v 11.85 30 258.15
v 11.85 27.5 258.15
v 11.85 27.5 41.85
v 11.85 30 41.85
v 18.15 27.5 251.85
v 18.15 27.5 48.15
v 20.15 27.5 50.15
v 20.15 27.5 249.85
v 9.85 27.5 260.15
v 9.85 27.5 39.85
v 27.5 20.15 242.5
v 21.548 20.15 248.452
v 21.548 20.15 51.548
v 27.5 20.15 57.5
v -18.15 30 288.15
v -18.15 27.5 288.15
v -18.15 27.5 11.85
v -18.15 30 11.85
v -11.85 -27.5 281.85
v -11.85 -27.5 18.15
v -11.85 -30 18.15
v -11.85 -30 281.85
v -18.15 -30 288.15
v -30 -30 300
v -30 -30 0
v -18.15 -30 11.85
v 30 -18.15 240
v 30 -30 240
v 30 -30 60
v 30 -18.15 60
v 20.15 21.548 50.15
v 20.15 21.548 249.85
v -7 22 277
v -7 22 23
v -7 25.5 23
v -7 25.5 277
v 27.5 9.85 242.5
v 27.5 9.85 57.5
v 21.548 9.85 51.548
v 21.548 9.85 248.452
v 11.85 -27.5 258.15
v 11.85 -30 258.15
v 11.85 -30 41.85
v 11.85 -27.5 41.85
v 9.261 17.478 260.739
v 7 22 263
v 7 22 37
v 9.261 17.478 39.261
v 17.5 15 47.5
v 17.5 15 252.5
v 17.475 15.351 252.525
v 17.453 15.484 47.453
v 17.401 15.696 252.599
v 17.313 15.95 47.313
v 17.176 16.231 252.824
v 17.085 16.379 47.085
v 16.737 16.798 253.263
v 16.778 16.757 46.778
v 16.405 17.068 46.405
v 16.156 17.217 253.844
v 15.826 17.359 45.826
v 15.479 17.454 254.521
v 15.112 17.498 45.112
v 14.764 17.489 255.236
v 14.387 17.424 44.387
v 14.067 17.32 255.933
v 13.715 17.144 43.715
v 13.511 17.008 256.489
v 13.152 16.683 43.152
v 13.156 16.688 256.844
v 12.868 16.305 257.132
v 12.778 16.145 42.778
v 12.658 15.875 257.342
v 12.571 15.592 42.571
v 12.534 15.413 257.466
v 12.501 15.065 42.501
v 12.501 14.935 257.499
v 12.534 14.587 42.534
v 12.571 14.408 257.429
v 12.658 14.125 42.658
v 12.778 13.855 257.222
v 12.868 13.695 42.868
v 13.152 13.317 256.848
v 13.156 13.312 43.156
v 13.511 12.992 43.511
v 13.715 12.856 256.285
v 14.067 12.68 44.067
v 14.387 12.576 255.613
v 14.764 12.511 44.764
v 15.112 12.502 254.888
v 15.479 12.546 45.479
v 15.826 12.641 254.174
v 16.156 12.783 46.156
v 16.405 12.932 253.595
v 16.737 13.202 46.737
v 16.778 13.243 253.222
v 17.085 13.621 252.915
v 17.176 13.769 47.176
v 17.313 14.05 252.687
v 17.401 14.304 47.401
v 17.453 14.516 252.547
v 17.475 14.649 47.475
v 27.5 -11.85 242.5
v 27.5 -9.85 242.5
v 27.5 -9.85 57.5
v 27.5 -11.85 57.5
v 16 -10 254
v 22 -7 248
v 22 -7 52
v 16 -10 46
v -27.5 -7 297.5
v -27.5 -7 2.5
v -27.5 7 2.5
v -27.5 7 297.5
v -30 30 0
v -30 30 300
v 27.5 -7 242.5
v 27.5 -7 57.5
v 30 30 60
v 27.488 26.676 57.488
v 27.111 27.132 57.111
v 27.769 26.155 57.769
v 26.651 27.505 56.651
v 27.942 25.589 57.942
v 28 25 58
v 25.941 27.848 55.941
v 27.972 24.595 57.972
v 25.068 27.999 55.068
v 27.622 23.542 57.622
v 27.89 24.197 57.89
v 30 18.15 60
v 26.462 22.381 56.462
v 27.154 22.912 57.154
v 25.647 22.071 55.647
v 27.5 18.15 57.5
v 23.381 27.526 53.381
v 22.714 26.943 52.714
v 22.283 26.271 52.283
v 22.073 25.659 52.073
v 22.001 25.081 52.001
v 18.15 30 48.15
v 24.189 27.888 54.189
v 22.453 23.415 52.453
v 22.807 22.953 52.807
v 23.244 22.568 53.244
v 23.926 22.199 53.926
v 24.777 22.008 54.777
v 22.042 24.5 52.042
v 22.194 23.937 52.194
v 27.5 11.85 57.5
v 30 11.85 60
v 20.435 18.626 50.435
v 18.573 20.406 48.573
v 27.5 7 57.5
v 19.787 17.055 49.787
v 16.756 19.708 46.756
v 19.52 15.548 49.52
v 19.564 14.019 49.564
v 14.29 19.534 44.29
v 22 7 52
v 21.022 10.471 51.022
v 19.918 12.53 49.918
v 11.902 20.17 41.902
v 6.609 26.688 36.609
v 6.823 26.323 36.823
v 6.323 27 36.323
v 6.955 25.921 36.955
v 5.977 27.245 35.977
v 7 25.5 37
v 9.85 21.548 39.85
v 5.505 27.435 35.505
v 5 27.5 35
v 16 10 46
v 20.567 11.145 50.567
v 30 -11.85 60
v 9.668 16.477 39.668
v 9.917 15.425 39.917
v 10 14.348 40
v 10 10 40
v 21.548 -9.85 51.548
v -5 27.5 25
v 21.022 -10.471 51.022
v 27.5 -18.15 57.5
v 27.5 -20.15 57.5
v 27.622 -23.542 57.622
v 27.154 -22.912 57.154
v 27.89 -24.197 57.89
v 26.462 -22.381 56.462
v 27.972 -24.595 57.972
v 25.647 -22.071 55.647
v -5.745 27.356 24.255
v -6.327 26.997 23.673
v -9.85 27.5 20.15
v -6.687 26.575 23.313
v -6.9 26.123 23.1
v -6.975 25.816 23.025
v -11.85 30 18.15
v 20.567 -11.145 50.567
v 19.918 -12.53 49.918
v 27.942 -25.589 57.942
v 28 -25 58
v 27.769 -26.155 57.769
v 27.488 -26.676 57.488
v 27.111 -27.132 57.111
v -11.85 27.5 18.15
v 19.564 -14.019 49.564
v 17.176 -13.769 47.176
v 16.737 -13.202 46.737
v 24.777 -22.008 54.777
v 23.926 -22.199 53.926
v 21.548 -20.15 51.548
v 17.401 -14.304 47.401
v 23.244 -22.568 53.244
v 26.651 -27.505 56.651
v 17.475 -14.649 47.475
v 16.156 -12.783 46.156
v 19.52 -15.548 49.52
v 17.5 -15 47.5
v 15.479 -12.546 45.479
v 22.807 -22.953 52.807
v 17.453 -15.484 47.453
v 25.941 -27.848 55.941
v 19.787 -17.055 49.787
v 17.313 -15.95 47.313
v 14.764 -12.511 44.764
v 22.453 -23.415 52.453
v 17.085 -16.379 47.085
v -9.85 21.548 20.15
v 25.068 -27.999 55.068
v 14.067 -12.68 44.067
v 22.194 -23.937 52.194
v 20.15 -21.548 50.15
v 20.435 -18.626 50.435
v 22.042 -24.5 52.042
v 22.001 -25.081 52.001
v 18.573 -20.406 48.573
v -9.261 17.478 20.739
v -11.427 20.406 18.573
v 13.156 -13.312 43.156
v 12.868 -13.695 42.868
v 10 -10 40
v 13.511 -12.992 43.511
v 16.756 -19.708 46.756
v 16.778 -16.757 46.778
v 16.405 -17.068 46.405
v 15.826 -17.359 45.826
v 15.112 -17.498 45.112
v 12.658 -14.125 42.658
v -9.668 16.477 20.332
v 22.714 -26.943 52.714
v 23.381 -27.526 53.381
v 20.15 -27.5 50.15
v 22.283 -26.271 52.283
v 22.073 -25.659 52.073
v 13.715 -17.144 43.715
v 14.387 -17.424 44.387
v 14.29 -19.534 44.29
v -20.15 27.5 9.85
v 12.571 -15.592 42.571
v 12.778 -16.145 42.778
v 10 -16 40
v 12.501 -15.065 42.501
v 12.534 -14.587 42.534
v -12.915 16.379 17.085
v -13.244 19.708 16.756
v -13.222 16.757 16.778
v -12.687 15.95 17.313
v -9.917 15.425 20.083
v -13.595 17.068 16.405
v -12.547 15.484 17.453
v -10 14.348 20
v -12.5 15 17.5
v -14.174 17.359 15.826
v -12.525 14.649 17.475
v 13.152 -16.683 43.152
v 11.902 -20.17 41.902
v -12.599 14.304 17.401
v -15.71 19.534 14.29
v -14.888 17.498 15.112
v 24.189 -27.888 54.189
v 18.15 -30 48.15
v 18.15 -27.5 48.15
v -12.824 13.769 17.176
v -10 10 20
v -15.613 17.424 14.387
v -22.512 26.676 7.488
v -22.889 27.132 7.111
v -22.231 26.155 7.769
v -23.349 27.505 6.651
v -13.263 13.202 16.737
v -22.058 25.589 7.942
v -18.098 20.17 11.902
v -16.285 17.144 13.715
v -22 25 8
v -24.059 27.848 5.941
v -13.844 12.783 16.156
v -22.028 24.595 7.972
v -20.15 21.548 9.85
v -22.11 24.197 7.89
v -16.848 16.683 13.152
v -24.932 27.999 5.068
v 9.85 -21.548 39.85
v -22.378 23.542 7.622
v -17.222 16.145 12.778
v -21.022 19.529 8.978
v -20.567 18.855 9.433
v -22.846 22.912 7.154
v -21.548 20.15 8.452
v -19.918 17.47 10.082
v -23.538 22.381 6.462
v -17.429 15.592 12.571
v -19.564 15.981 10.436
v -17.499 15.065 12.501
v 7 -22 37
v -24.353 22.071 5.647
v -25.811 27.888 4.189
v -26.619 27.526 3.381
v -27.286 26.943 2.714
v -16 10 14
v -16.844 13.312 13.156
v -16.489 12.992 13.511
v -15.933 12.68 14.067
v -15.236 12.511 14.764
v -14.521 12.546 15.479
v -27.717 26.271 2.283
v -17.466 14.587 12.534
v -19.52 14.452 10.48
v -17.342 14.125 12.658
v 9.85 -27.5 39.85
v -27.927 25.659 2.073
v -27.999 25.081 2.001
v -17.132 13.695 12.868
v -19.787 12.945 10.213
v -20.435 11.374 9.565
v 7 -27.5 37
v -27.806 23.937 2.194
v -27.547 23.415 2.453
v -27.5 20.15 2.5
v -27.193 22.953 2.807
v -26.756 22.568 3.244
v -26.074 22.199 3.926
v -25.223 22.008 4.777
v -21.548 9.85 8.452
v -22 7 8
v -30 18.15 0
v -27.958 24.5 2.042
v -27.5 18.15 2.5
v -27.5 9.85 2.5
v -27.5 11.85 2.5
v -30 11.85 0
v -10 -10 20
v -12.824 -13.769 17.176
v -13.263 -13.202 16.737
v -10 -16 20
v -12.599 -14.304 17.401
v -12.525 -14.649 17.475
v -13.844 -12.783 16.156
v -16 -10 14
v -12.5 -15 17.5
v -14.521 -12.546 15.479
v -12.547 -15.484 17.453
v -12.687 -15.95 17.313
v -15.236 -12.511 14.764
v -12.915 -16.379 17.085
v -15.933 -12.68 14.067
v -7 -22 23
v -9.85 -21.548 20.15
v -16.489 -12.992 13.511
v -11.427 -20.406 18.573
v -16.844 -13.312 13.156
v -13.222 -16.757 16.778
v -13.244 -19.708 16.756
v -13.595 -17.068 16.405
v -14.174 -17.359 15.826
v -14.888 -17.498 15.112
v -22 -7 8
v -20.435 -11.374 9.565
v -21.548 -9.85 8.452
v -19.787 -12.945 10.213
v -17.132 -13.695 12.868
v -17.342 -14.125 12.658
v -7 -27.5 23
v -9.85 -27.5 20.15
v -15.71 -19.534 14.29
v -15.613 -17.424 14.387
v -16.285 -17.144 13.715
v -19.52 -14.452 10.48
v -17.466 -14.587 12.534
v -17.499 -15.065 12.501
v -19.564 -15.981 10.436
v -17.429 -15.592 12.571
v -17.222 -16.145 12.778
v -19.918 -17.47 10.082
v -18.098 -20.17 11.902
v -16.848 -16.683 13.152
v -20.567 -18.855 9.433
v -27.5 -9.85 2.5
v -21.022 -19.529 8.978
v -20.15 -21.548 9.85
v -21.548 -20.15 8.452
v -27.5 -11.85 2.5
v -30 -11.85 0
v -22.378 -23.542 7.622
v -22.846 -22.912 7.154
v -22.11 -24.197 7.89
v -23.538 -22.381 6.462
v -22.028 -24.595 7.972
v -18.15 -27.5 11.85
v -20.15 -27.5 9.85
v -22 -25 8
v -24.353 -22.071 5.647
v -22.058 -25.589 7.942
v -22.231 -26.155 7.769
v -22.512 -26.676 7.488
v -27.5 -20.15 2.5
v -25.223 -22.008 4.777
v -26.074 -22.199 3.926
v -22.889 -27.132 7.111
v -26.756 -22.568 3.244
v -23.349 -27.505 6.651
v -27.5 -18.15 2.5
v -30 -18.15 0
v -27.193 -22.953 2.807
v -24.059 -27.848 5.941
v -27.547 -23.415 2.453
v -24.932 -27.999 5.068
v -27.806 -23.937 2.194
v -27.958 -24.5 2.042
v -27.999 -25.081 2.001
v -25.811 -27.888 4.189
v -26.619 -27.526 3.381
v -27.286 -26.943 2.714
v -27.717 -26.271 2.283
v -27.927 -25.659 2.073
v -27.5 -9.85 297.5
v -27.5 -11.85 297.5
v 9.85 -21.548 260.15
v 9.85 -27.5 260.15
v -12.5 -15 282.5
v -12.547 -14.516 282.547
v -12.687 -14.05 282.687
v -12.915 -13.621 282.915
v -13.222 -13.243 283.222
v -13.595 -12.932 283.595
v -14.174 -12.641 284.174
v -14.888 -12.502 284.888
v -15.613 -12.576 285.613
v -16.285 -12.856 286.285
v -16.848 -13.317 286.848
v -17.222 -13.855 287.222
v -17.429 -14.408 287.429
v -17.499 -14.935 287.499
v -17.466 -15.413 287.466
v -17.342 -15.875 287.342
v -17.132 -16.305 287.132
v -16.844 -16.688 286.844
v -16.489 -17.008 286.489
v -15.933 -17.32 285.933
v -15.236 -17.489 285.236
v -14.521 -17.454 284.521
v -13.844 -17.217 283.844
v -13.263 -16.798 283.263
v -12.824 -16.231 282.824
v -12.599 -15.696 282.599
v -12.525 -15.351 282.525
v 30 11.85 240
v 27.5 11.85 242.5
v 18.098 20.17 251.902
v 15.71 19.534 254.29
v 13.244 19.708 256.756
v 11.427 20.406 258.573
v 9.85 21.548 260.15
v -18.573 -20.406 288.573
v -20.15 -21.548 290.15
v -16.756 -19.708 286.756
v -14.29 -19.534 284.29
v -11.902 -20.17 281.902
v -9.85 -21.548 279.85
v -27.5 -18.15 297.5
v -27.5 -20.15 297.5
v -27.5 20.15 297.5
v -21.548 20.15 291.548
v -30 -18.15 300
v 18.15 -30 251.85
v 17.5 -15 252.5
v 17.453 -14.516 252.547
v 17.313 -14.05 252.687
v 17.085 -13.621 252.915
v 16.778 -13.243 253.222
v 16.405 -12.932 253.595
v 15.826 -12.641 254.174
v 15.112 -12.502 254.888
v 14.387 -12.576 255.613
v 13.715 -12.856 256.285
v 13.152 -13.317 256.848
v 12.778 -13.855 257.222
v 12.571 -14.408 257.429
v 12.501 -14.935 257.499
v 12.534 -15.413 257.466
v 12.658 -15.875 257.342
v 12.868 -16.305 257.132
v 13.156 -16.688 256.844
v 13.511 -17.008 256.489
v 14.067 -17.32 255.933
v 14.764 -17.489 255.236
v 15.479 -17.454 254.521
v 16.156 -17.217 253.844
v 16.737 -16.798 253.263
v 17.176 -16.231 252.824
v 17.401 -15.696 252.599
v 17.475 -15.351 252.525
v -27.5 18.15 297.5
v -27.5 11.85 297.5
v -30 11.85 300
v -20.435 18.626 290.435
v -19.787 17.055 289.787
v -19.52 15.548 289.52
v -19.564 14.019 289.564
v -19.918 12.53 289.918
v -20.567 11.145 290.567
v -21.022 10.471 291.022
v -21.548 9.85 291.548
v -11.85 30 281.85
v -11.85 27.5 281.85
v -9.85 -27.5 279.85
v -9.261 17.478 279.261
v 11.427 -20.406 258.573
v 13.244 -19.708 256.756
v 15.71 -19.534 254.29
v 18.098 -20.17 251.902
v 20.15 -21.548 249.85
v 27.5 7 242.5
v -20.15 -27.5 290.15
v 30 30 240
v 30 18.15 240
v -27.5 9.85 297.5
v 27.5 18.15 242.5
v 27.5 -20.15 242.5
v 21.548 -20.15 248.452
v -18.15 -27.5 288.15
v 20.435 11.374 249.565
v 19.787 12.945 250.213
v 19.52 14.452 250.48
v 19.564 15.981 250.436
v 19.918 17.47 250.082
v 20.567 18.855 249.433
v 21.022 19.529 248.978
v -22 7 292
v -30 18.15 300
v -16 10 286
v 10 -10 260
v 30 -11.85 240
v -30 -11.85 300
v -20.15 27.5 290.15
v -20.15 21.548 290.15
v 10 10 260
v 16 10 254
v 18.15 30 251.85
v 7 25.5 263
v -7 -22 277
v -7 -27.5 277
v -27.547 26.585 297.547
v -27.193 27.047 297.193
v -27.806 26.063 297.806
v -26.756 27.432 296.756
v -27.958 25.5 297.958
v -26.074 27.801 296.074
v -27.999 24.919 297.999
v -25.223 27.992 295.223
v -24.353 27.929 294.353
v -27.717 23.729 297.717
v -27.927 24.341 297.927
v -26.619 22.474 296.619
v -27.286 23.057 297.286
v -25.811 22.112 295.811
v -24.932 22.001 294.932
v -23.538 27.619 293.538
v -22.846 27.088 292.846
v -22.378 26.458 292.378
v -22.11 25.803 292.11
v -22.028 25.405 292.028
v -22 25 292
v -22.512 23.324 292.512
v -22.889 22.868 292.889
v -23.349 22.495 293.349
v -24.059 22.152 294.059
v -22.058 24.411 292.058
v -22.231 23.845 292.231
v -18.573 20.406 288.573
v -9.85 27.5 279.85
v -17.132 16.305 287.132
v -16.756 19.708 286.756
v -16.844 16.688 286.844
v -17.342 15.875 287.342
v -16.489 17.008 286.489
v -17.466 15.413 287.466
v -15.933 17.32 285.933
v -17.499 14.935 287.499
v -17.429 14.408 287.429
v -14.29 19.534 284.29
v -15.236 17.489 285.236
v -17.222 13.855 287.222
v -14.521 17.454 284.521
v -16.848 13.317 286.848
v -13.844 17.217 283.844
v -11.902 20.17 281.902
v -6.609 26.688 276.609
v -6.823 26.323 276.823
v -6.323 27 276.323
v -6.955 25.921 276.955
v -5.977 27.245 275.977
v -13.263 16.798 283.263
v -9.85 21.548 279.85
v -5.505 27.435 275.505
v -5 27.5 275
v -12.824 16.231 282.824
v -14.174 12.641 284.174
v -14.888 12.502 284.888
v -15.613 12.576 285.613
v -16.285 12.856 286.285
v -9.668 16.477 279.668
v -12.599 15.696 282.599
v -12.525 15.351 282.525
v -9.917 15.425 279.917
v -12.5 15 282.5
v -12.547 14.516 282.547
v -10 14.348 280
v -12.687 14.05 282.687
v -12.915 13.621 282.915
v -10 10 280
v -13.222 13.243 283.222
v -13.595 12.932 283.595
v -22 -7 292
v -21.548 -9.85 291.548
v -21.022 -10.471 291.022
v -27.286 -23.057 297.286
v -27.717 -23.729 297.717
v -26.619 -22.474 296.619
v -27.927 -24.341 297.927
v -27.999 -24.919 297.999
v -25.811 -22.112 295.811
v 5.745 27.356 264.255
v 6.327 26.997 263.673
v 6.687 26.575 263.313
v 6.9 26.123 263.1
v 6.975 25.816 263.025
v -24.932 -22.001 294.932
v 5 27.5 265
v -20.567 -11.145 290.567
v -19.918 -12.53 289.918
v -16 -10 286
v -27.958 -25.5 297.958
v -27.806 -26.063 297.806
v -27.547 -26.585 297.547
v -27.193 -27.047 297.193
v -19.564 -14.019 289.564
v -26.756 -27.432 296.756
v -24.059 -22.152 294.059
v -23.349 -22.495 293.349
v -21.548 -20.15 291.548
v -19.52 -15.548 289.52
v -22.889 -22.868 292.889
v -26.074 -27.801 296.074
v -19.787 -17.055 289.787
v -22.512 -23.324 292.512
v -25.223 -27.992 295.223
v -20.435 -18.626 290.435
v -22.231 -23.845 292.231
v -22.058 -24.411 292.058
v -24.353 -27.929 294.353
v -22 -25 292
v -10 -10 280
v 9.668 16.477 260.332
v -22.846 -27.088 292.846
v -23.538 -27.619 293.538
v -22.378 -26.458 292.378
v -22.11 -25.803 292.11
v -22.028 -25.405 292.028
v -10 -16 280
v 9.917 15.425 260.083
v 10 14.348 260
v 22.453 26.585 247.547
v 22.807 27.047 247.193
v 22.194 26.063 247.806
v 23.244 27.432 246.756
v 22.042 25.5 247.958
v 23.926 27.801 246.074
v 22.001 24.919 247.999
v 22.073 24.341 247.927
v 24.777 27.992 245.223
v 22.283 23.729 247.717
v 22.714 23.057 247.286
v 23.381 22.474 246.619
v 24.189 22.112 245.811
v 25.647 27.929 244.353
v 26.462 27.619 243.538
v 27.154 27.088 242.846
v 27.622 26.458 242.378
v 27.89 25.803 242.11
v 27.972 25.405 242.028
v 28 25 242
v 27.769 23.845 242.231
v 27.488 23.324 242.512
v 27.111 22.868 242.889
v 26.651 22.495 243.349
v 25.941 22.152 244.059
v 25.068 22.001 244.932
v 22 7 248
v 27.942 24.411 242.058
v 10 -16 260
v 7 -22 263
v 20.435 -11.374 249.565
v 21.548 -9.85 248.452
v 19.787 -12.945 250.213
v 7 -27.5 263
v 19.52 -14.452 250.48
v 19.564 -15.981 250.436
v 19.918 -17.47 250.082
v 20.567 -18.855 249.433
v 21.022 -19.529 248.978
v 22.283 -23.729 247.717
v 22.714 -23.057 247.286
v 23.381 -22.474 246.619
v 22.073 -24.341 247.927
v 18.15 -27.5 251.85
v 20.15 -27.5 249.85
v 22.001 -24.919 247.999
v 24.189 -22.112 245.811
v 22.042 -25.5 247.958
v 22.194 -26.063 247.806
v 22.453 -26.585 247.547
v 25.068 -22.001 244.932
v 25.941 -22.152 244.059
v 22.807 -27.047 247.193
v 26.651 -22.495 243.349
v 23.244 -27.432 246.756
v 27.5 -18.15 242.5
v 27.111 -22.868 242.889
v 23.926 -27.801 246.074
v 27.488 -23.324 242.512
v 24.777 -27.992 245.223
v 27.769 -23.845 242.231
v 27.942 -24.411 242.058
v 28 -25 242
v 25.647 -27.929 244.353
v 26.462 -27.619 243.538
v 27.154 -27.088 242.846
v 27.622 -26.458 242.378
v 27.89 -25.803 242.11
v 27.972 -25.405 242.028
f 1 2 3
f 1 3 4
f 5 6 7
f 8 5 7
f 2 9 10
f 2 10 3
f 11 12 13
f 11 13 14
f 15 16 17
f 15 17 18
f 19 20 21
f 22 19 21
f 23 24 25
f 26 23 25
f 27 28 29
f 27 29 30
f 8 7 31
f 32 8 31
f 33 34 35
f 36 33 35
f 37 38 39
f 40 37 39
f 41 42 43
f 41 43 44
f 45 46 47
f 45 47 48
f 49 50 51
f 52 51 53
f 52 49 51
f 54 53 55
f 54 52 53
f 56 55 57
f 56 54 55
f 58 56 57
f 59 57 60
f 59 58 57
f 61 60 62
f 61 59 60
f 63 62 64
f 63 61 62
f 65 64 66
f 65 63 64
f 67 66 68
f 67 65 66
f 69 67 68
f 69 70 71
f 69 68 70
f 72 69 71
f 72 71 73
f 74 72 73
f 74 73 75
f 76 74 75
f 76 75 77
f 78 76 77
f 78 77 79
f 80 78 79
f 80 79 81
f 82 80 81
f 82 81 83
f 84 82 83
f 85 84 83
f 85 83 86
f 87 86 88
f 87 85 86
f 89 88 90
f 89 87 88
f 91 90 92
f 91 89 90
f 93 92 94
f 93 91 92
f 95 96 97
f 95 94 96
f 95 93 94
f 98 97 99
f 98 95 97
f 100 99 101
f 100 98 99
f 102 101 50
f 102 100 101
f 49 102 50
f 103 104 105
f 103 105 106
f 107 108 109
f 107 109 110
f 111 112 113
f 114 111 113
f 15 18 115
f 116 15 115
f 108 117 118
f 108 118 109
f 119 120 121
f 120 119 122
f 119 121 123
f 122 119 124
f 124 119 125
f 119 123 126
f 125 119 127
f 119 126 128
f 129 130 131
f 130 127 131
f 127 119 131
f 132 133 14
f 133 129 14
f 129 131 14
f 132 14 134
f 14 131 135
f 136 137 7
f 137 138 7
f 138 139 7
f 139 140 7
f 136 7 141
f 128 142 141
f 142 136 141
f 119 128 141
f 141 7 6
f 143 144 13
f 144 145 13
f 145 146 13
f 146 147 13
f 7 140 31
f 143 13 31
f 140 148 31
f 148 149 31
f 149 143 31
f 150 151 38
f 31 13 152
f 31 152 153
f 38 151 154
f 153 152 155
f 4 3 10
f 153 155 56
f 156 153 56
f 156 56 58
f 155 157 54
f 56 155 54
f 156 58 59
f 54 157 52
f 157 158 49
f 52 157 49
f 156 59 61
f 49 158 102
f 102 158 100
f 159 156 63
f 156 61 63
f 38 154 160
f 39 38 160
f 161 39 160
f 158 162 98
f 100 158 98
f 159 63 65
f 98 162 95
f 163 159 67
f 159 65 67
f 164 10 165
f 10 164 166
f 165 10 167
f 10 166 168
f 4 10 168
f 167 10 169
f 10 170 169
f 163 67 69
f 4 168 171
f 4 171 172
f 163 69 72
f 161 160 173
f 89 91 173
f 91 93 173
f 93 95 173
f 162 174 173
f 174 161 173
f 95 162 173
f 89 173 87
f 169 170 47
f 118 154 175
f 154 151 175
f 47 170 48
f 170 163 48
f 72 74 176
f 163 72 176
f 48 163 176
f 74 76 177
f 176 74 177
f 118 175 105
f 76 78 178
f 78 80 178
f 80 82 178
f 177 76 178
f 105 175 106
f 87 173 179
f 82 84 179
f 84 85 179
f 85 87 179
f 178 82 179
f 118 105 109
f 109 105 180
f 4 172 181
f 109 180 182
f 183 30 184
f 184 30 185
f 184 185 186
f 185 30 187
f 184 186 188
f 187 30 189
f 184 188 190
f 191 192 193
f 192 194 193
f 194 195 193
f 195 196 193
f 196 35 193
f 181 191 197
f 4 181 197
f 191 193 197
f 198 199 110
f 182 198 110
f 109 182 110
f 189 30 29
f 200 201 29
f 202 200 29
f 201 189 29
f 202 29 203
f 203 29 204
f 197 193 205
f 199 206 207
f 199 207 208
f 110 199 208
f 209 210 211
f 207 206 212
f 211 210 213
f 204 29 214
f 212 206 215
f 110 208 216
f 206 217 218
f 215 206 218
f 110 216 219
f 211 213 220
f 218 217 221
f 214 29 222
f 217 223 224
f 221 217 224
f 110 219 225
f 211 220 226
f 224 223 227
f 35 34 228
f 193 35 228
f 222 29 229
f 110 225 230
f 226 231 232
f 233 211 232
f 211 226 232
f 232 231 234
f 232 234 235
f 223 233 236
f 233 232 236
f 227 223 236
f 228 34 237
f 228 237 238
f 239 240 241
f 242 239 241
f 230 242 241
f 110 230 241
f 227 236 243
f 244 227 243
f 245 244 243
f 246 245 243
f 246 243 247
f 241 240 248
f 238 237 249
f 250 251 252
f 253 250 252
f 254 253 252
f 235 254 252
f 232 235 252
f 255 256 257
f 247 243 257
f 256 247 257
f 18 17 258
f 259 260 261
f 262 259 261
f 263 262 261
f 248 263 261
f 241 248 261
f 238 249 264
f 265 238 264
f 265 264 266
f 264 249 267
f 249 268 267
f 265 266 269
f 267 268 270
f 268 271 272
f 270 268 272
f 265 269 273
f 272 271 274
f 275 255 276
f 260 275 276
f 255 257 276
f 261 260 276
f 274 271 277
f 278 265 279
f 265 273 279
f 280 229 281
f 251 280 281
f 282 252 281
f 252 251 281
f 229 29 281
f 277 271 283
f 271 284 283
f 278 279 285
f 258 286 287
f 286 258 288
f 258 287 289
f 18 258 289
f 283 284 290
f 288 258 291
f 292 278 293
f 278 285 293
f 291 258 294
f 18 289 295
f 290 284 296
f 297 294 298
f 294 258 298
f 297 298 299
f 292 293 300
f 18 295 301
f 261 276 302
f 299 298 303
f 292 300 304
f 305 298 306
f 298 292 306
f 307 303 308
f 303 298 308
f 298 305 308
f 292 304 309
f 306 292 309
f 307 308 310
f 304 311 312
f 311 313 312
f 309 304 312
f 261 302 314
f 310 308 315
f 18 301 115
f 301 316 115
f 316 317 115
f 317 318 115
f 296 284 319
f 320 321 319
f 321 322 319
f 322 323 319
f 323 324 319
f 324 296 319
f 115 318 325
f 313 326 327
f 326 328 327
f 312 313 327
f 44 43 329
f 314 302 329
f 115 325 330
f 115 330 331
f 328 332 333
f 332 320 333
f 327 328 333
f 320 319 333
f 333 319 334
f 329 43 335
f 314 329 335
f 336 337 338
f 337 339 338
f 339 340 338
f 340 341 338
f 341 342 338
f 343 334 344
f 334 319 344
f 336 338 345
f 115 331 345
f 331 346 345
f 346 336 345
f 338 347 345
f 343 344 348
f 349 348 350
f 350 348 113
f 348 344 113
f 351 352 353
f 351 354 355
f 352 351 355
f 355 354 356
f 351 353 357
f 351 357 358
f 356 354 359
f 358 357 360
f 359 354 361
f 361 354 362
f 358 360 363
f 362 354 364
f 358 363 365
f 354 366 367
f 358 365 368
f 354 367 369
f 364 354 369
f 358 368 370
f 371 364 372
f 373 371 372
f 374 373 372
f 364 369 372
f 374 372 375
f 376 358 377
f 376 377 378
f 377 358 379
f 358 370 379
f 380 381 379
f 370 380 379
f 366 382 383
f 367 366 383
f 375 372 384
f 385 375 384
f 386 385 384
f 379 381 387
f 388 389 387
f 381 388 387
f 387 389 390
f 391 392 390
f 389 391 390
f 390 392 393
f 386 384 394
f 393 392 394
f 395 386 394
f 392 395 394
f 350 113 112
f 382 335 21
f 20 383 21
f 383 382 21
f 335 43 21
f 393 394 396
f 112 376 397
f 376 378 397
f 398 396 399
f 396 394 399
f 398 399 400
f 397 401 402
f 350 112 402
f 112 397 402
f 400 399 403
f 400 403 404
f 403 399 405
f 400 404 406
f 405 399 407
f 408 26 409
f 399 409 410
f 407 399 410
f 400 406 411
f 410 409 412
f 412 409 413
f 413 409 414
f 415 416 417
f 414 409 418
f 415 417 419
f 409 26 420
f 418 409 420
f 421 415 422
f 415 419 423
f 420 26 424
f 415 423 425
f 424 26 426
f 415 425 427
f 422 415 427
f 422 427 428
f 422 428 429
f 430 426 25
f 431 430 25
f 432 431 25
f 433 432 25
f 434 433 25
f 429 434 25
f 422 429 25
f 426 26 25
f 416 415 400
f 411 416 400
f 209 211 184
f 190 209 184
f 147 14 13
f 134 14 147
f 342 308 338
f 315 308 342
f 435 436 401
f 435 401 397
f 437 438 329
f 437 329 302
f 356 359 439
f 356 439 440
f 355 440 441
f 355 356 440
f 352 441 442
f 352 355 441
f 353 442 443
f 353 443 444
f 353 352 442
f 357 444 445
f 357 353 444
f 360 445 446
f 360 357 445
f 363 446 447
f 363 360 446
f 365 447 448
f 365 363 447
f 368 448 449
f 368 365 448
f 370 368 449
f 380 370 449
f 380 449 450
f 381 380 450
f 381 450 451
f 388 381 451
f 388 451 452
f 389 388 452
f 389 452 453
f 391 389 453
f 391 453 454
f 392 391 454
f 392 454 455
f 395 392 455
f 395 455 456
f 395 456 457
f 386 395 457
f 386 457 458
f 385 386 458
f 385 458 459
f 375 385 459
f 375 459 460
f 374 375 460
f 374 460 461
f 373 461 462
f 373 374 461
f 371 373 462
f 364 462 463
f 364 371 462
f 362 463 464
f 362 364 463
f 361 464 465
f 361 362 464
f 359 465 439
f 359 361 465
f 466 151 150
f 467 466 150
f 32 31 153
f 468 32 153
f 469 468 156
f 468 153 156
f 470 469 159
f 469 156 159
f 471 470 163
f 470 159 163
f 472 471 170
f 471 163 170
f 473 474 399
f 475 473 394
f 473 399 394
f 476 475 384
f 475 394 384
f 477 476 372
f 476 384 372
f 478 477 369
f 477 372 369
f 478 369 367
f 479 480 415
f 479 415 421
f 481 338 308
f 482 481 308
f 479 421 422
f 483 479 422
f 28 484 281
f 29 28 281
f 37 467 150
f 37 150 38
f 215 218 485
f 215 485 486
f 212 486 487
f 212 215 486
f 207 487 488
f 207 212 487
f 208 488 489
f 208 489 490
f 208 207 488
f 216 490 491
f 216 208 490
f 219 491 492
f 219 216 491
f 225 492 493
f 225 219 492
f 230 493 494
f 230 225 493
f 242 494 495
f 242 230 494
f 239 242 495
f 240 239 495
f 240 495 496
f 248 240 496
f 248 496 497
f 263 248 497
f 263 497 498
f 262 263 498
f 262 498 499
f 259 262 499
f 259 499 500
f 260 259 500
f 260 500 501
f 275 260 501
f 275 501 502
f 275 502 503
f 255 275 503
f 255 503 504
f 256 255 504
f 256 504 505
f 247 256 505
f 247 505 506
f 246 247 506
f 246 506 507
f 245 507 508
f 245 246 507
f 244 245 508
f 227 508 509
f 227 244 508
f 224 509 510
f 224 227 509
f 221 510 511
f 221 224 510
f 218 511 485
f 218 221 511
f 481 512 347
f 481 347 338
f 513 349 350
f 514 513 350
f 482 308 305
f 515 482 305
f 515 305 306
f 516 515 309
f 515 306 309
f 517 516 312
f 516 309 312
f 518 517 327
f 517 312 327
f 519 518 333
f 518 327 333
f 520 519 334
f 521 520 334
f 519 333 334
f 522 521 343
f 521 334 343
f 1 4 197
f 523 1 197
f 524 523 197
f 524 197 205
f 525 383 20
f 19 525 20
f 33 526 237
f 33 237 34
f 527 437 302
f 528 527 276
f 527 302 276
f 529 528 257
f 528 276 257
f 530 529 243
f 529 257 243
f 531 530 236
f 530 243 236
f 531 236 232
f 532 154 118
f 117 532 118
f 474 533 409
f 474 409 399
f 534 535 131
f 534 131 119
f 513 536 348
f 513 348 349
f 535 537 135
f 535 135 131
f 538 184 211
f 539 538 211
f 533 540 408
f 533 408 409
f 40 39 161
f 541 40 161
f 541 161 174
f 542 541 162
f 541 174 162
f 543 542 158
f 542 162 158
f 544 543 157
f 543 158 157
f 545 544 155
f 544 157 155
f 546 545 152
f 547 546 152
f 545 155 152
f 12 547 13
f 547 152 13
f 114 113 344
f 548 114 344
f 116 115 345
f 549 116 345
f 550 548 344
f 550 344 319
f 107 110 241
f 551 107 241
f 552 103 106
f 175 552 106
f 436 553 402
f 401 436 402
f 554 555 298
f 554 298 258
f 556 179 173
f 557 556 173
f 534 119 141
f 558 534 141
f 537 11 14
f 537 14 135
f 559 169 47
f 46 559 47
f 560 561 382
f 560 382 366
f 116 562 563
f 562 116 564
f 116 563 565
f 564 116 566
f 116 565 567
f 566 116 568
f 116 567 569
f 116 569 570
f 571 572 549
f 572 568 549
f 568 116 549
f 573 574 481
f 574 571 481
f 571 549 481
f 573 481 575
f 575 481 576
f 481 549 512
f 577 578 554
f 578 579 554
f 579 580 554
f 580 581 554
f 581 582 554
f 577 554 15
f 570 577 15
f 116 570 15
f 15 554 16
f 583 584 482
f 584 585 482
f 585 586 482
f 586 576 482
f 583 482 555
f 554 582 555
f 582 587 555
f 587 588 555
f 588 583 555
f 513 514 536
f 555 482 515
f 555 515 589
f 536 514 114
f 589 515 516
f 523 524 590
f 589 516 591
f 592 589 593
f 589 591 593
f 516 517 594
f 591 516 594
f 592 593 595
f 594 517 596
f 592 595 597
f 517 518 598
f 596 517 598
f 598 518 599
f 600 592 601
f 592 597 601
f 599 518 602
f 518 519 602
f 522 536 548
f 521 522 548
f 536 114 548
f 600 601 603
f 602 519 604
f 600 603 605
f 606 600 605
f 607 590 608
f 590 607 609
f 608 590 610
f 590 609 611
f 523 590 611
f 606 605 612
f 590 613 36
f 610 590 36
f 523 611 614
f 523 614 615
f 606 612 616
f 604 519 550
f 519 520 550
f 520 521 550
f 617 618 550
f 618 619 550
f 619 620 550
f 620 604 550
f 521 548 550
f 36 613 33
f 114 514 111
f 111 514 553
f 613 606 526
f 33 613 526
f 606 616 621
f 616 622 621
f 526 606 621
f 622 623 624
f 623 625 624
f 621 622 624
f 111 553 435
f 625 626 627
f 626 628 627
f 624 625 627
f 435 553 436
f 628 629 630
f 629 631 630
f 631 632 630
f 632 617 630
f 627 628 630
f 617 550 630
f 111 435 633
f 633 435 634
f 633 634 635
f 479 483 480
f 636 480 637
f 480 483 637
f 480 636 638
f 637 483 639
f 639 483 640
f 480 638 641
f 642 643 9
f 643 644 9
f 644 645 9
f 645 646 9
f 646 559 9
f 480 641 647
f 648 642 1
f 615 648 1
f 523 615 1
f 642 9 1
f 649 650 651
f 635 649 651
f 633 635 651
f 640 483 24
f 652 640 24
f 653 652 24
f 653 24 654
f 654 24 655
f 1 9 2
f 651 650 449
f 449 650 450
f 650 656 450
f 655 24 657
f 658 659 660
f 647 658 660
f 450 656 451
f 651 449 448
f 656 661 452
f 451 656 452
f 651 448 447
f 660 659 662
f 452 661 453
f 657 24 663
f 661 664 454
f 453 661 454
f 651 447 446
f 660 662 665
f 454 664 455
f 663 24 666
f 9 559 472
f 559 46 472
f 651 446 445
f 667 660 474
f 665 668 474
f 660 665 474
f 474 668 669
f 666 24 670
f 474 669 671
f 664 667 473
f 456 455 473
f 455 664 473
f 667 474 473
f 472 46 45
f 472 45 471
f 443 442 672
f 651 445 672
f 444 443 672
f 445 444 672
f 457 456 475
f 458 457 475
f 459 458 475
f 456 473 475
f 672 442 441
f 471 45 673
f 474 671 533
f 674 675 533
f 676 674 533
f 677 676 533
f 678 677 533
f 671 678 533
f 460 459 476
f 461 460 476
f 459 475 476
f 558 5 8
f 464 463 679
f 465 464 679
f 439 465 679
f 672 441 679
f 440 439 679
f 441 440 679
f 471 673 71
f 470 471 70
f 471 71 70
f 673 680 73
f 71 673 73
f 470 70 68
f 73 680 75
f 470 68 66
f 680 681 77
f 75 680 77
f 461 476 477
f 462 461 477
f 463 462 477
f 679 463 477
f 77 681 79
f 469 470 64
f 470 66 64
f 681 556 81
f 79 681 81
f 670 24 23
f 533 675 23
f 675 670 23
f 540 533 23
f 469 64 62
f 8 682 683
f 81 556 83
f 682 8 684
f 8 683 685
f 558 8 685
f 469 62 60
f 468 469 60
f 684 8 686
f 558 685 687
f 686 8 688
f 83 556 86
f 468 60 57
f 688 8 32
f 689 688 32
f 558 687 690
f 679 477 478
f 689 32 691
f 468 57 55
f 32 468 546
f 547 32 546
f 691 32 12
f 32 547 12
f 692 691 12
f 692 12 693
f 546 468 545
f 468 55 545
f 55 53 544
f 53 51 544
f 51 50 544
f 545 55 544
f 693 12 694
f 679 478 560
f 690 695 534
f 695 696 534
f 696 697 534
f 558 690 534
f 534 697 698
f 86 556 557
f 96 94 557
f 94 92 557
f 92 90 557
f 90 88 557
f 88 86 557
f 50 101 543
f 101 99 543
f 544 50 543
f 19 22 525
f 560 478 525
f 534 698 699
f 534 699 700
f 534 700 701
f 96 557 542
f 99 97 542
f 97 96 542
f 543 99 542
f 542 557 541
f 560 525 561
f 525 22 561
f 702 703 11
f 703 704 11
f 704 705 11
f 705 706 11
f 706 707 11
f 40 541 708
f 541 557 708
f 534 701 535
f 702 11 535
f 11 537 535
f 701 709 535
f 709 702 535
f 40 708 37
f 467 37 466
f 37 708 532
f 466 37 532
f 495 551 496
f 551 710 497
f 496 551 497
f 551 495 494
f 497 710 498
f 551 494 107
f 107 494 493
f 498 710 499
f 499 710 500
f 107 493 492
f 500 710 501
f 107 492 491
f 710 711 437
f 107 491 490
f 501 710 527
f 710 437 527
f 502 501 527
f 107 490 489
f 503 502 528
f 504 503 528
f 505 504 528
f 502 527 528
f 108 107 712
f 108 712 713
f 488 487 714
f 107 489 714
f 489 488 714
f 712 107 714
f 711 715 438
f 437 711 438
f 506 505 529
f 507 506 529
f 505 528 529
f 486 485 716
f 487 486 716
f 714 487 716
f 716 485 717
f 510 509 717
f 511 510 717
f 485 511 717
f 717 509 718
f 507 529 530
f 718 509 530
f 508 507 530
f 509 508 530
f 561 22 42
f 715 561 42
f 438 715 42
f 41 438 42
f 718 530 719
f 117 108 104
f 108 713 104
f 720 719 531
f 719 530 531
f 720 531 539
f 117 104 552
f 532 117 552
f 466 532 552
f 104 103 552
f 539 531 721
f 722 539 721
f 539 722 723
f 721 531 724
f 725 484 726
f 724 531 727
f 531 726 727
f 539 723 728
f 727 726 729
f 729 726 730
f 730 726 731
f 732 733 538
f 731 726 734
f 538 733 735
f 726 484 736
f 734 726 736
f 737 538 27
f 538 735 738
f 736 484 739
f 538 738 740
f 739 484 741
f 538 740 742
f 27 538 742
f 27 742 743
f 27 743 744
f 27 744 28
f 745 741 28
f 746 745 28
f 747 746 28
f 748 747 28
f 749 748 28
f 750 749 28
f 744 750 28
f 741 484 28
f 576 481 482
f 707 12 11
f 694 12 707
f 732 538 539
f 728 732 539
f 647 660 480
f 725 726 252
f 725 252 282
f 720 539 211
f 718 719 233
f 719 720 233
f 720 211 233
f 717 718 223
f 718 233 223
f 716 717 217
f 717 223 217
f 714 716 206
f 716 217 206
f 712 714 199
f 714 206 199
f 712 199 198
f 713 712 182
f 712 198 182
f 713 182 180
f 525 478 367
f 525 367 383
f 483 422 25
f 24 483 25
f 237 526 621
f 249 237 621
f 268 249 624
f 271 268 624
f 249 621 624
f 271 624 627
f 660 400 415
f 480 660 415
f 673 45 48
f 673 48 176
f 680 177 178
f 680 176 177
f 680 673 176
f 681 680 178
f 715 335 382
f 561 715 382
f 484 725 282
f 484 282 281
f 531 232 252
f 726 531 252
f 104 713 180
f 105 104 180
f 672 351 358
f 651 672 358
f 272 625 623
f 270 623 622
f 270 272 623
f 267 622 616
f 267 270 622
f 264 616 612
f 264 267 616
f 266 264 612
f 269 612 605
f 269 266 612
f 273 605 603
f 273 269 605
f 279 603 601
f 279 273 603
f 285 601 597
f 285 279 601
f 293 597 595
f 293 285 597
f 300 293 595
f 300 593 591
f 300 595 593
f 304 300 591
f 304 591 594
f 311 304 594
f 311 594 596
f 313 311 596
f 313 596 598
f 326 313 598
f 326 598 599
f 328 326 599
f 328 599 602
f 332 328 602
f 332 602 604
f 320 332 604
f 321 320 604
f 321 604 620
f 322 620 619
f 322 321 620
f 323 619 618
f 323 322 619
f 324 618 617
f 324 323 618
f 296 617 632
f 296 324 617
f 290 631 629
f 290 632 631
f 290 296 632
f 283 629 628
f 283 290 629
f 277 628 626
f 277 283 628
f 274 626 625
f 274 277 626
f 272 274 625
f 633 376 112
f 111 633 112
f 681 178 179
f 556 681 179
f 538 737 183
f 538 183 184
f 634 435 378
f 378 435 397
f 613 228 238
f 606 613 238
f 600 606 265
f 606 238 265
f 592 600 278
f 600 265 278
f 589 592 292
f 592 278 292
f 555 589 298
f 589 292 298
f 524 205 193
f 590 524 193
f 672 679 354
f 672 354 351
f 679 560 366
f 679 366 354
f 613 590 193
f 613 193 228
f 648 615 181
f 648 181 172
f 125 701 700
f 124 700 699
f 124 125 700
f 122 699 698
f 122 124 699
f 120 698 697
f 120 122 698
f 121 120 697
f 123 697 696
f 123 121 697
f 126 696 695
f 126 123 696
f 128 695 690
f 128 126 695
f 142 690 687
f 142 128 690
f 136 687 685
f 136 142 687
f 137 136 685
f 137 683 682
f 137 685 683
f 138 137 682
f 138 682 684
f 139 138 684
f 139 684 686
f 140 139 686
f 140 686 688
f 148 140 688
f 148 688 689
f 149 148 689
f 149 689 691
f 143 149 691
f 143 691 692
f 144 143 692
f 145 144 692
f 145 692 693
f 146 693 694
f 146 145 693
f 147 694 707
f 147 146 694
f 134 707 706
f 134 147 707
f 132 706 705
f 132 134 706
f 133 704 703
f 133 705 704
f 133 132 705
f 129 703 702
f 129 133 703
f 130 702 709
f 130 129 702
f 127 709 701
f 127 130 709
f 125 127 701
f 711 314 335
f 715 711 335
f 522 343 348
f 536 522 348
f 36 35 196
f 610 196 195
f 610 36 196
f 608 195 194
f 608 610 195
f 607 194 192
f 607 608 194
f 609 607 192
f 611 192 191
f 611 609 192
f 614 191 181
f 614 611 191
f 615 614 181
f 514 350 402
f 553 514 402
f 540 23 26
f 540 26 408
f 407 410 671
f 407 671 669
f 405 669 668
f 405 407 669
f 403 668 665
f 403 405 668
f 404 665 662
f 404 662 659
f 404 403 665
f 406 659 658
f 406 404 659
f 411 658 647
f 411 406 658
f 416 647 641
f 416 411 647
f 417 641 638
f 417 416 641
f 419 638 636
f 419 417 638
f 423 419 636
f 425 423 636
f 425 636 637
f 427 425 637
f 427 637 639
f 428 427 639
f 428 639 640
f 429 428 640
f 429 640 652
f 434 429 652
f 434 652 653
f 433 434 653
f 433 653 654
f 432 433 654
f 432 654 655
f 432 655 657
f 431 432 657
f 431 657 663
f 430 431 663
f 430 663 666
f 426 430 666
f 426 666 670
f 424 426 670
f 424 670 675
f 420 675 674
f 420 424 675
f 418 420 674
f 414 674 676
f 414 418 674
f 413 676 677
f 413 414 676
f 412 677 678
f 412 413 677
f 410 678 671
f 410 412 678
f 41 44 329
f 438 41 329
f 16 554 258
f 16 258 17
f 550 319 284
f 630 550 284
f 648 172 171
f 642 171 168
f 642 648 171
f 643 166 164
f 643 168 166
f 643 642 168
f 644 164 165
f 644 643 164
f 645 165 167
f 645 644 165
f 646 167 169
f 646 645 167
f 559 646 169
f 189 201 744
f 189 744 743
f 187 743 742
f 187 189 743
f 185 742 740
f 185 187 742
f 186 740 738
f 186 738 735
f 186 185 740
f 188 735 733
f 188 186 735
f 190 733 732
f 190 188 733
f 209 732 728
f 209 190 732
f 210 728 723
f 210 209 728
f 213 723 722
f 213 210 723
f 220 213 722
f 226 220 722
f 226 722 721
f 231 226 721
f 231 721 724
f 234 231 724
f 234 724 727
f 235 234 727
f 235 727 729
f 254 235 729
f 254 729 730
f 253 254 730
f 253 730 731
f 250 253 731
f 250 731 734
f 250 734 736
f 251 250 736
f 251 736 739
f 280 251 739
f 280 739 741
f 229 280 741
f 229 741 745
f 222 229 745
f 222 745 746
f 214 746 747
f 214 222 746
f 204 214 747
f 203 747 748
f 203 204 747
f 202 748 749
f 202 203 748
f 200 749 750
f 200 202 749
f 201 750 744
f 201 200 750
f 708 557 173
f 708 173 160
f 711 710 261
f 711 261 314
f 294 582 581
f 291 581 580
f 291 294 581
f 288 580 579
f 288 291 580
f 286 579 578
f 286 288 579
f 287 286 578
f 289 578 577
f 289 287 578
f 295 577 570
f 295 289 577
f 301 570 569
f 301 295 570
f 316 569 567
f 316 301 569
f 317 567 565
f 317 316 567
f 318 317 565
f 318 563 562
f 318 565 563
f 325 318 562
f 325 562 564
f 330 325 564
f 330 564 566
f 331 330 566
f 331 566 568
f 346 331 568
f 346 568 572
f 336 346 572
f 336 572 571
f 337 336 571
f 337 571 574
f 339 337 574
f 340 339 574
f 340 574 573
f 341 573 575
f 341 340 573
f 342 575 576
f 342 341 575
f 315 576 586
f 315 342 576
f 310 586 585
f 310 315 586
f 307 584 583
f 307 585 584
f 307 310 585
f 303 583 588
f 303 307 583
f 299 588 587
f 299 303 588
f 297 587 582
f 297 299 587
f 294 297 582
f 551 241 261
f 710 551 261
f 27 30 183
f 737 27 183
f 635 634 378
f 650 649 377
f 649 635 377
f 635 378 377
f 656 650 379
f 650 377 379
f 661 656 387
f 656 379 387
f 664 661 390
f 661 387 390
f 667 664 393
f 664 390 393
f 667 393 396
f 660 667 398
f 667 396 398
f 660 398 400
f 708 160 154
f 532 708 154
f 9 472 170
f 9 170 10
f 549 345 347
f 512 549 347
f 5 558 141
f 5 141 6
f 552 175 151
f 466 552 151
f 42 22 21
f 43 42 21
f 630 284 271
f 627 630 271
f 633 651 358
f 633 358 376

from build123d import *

# Parameters (mm, degrees)
F0_R          = 3
F0_R_2        = 2.5
F1_DEPTH      = 300
F2_R          = 2
F3_R          = 7
F6_DEPTH      = 30
F6_DEPTH_BACK = 30


# Not quite as in the source:
# - a feature names something its author has since deleted; it is built from what else it names


with BuildPart() as f1:
    # F0 (on Top) → F1 (new body)
    with BuildSketch(Plane.XY):
        with BuildLine():
            Line((18.15, -30), (30, -30))
            Line((30, -30), (30, -18.15))
            Line((30, -18.15), (27.5, -18.15))
            Line((27.5, -18.15), (27.5, -20.15))
            Line((27.5, -20.15), (21.5477069044, -20.15))
            ThreePointArc((21.5477069044, -20.15), (19.5, -15), (21.5477069044, -9.85))
            Line((21.5477069044, -9.85), (27.5, -9.85))
            Line((27.5, -9.85), (27.5, -11.85))
            Line((27.5, -11.85), (30, -11.85))
            Line((30, -11.85), (30, 11.85))
            Line((30, 11.85), (27.5, 11.85))
            Line((27.5, 11.85), (27.5, 9.85))
            Line((27.5, 9.85), (21.5477069044, 9.85))
            ThreePointArc((21.5477069044, 9.85), (19.5, 15), (21.5477069044, 20.15))
            Line((21.5477069044, 20.15), (27.5, 20.15))
            Line((27.5, 20.15), (27.5, 18.15))
            Line((27.5, 18.15), (30, 18.15))
            Line((30, 18.15), (30, 30))
            Line((30, 30), (18.15, 30))
            Line((18.15, 30), (18.15, 27.5))
            Line((18.15, 27.5), (20.15, 27.5))
            Line((20.15, 27.5), (20.15, 21.5477069044))
            ThreePointArc((20.15, 21.5477069044), (15, 19.5), (9.85, 21.5477069044))
            Line((9.85, 21.5477069044), (9.85, 27.5))
            Line((9.85, 27.5), (11.85, 27.5))
            Line((11.85, 27.5), (11.85, 30))
            Line((11.85, 30), (-11.85, 30))
            Line((-11.85, 30), (-11.85, 27.5))
            Line((-11.85, 27.5), (-9.85, 27.5))
            Line((-9.85, 27.5), (-9.85, 21.5477069044))
            ThreePointArc((-9.85, 21.5477069044), (-15, 19.5), (-20.15, 21.5477069044))
            Line((-20.15, 21.5477069044), (-20.15, 27.5))
            Line((-20.15, 27.5), (-18.15, 27.5))
            Line((-18.15, 27.5), (-18.15, 30))
            Line((-18.15, 30), (-30, 30))
            Line((-30, 30), (-30, 18.15))
            Line((-30, 18.15), (-27.5, 18.15))
            Line((-27.5, 18.15), (-27.5, 20.15))
            Line((-27.5, 20.15), (-21.5477069044, 20.15))
            ThreePointArc((-21.5477069044, 20.15), (-19.5, 15), (-21.5477069044, 9.85))
            Line((-21.5477069044, 9.85), (-27.5, 9.85))
            Line((-27.5, 9.85), (-27.5, 11.85))
            Line((-27.5, 11.85), (-30, 11.85))
            Line((-30, 11.85), (-30, -11.85))
            Line((-30, -11.85), (-27.5, -11.85))
            Line((-27.5, -11.85), (-27.5, -9.85))
            Line((-27.5, -9.85), (-21.5477069044, -9.85))
            ThreePointArc((-21.5477069044, -9.85), (-19.5, -15), (-21.5477069044, -20.15))
            Line((-21.5477069044, -20.15), (-27.5, -20.15))
            Line((-27.5, -20.15), (-27.5, -18.15))
            Line((-27.5, -18.15), (-30, -18.15))
            Line((-30, -18.15), (-30, -30))
            Line((-30, -30), (-18.15, -30))
            Line((-18.15, -30), (-18.15, -27.5))
            Line((-18.15, -27.5), (-20.15, -27.5))
            Line((-20.15, -27.5), (-20.15, -21.5477069044))
            ThreePointArc((-20.15, -21.5477069044), (-15, -19.5), (-9.85, -21.5477069044))
            Line((-9.85, -21.5477069044), (-9.85, -27.5))
            Line((-9.85, -27.5), (-11.85, -27.5))
            Line((-11.85, -27.5), (-11.85, -30))
            Line((-11.85, -30), (11.85, -30))
            Line((11.85, -30), (11.85, -27.5))
            Line((11.85, -27.5), (9.85, -27.5))
            Line((9.85, -27.5), (9.85, -21.5477069044))
            ThreePointArc((9.85, -21.5477069044), (15, -19.5), (20.15, -21.5477069044))
            Line((20.15, -21.5477069044), (20.15, -27.5))
            Line((20.15, -27.5), (18.15, -27.5))
            Line((18.15, -27.5), (18.15, -30))
        make_face()
        with Locations((-25, -25)):
            Circle(F0_R, mode=Mode.SUBTRACT)
        with Locations((-15, -15)):
            Circle(F0_R_2, mode=Mode.SUBTRACT)
        with Locations((25, -25)):
            Circle(F0_R, mode=Mode.SUBTRACT)
        with Locations((15, -15)):
            Circle(F0_R_2, mode=Mode.SUBTRACT)
        with Locations((-25, 25)):
            Circle(F0_R, mode=Mode.SUBTRACT)
        with Locations((-15, 15)):
            Circle(F0_R_2, mode=Mode.SUBTRACT)
        Polygon((-7, 22), (-7, 27.5), (0, 27.5), (7, 27.5), (7, 22), (10, 16), (10, 10), (16, 10), (22, 7), (27.5, 7), (27.5, 0), (27.5, -7), (22, -7), (16, -10), (10, -10), (10, -16), (7, -22), (7, -27.5), (0, -27.5), (-7, -27.5), (-7, -22), (-10, -16), (-10, -10), (-16, -10), (-22, -7), (-27.5, -7), (-27.5, 0), (-27.5, 7), (-22, 7), (-16, 10), (-10, 10), (-10, 16), align=None, mode=Mode.SUBTRACT)
        with Locations((15, 15)):
            Circle(F0_R_2, mode=Mode.SUBTRACT)
        with Locations((25, 25)):
            Circle(F0_R, mode=Mode.SUBTRACT)
    extrude(amount=F1_DEPTH)

    # F2
    f2_edges = [f1.edges().sort_by_distance(p)[0] for p in [
        (-7, 27.5, 150),
        (7, 27.5, 150),
    ]]
    fillet(f2_edges, radius=F2_R)

    # F3
    f3_edges = [f1.edges().sort_by_distance(p)[0] for p in [
        (-10, 16, 150),
        (10, 16, 150),
    ]]
    fillet(f3_edges, radius=F3_R)

    # F5 (on Front) → F6 (cut, two sides)
    with BuildSketch(Plane.XZ) as f6_sk:
        Polygon((144.6894081855, 37.2119464586), (75.9506773221, 105.9506773221), (-30, 0), (38.7387308634, -68.7387308634), align=None)
        Polygon((81.6358354247, 188.3641645753), (150.3745847274, 257.102913878), (38.7387493027, 368.7387493027), (-30, 300), align=None)
    extrude(amount=F6_DEPTH, mode=Mode.SUBTRACT)
    extrude(f6_sk.sketch, amount=-F6_DEPTH_BACK, mode=Mode.SUBTRACT)


solid = f1.part
